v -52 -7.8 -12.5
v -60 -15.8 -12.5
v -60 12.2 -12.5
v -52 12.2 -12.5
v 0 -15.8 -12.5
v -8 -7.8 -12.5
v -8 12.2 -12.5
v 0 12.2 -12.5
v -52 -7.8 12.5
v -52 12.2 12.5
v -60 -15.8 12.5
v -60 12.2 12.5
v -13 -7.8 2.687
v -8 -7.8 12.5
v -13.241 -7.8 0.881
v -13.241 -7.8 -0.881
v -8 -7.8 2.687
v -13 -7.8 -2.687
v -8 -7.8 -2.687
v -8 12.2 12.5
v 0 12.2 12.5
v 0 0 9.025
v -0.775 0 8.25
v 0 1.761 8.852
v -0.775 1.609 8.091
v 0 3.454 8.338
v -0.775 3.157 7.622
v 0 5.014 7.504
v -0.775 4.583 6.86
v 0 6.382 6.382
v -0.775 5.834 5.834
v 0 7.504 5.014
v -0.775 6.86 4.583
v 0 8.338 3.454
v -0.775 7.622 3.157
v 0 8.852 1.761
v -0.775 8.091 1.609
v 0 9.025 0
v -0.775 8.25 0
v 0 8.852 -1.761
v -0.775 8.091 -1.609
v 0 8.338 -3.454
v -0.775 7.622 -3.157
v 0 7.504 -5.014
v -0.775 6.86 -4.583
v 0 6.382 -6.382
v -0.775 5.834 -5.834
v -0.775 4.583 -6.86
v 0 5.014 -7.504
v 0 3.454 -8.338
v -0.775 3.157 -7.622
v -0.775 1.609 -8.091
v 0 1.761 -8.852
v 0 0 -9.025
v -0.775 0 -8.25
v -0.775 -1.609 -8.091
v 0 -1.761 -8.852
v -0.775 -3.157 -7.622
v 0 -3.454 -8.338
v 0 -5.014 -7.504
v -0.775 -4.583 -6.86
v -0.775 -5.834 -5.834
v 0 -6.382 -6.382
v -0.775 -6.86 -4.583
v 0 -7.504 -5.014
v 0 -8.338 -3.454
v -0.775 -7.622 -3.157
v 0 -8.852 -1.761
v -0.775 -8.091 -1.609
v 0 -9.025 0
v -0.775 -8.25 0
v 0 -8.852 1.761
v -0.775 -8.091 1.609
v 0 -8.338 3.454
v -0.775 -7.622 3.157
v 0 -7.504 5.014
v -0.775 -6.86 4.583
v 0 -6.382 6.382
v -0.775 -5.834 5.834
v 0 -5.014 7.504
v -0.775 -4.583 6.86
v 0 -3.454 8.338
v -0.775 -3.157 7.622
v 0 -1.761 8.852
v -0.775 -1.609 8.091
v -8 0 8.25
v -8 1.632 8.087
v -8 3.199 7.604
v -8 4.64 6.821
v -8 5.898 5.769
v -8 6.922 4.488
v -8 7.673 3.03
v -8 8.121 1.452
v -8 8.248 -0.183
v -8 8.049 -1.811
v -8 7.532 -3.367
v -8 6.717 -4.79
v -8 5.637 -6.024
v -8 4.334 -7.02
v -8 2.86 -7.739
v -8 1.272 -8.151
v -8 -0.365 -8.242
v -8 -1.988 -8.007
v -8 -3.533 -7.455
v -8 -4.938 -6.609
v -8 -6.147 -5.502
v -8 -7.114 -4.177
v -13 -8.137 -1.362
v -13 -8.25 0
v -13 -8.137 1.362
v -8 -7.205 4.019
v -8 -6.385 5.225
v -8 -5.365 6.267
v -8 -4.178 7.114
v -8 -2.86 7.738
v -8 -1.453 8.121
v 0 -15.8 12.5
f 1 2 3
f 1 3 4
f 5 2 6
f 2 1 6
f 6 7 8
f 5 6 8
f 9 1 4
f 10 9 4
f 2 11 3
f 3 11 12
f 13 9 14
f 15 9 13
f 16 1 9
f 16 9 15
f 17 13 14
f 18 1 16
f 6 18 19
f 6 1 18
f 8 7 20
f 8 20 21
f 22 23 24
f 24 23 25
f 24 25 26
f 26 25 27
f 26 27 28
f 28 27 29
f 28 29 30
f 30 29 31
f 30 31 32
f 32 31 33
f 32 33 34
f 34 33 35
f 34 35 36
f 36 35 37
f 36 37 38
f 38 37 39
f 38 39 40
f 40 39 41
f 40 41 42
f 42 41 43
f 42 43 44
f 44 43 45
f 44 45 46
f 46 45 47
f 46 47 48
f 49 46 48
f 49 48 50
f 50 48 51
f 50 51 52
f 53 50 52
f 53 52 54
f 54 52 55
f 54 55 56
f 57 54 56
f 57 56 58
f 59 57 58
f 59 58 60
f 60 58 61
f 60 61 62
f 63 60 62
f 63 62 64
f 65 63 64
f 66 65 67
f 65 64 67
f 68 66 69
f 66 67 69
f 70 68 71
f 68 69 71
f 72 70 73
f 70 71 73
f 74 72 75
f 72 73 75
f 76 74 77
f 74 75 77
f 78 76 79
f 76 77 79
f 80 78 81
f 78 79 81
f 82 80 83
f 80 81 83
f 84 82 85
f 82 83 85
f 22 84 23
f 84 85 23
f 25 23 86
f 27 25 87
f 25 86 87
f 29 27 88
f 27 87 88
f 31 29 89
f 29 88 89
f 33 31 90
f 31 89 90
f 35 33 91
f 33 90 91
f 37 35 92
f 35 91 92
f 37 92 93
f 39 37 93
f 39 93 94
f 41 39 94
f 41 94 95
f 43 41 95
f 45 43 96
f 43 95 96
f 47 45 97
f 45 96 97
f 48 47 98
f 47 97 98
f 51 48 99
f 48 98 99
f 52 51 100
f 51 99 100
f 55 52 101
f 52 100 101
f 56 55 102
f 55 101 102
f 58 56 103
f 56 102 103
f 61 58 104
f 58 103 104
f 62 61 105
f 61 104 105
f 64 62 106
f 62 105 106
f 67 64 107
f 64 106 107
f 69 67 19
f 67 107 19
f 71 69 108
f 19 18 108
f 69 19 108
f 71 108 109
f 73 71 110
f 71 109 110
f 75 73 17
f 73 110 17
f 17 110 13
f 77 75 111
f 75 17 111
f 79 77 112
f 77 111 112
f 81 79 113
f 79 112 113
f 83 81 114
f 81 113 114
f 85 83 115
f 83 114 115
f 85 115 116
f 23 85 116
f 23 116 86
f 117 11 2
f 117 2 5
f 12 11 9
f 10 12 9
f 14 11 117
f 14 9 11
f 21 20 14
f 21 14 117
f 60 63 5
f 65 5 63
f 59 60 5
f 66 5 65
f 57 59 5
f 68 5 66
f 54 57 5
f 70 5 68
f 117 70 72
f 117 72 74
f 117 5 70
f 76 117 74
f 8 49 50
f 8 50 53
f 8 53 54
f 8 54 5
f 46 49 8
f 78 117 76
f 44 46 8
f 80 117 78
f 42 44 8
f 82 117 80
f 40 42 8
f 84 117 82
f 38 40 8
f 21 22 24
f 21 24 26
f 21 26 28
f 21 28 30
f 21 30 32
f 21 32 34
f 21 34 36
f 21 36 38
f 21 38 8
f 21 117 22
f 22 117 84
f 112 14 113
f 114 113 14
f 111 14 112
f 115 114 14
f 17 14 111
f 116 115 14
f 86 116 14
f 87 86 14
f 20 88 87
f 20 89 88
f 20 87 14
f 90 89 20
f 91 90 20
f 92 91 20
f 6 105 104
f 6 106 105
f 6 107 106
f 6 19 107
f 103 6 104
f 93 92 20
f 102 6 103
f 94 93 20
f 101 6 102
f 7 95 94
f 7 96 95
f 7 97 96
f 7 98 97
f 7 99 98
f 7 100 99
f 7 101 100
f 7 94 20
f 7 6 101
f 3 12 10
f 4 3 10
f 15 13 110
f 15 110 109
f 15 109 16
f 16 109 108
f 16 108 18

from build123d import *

# Parameters (mm, degrees)
SKETCH_1_W               = 60
SKETCH_1_H               = 28
EXTRUDE_1_DEPTH          = 12.5
CUT_EXTRUDE_1_DEPTH      = 64.292100613
CUT_EXTRUDE_1_DEPTH_BACK = 64.292100613
SKETCH_2_W               = 44
SKETCH_2_H               = 20
M18X1_51_D               = 16.5
M18X1_51_DEPTH           = 13
M18X1_51_CSINK_D         = 18.05
M18X1_51_CSINK_ANGLE     = 90
M18X1_51_TIP             = 4.957100107


with BuildPart() as part:
    # Эскиз1 → Бобышка-Вытянуть1 (new, symmetric)
    with BuildSketch(Plane.XY):
        with Locations((-30, -1.8)):
            Rectangle(SKETCH_1_W, SKETCH_1_H)
    extrude(amount=EXTRUDE_1_DEPTH, both=True)

    # Эскиз2 → Вырез-Вытянуть1 (cut, two sides: drawn at the far end of the back side and taken through both)
    with BuildSketch(Plane.XY.offset(-CUT_EXTRUDE_1_DEPTH_BACK)):
        with Locations((-30, 2.2)):
            Rectangle(SKETCH_2_W, SKETCH_2_H)
    extrude(amount=CUT_EXTRUDE_1_DEPTH + CUT_EXTRUDE_1_DEPTH_BACK, mode=Mode.SUBTRACT)

    # Отверстие обработанное метчиком M18x1.51
    with Locations(Plane(origin=(0, 0, 0), x_dir=(0, 0, -1), z_dir=(1, 0, 0))):
        with Locations((0, 0)):
            CounterSinkHole(M18X1_51_D / 2, M18X1_51_CSINK_D / 2, depth=M18X1_51_DEPTH, counter_sink_angle=M18X1_51_CSINK_ANGLE)
            with Locations((0, 0, -(M18X1_51_DEPTH + M18X1_51_TIP / 2))):  # 118° drill point
                Cone(0, M18X1_51_D / 2, M18X1_51_TIP, mode=Mode.SUBTRACT)


solid = part.part
